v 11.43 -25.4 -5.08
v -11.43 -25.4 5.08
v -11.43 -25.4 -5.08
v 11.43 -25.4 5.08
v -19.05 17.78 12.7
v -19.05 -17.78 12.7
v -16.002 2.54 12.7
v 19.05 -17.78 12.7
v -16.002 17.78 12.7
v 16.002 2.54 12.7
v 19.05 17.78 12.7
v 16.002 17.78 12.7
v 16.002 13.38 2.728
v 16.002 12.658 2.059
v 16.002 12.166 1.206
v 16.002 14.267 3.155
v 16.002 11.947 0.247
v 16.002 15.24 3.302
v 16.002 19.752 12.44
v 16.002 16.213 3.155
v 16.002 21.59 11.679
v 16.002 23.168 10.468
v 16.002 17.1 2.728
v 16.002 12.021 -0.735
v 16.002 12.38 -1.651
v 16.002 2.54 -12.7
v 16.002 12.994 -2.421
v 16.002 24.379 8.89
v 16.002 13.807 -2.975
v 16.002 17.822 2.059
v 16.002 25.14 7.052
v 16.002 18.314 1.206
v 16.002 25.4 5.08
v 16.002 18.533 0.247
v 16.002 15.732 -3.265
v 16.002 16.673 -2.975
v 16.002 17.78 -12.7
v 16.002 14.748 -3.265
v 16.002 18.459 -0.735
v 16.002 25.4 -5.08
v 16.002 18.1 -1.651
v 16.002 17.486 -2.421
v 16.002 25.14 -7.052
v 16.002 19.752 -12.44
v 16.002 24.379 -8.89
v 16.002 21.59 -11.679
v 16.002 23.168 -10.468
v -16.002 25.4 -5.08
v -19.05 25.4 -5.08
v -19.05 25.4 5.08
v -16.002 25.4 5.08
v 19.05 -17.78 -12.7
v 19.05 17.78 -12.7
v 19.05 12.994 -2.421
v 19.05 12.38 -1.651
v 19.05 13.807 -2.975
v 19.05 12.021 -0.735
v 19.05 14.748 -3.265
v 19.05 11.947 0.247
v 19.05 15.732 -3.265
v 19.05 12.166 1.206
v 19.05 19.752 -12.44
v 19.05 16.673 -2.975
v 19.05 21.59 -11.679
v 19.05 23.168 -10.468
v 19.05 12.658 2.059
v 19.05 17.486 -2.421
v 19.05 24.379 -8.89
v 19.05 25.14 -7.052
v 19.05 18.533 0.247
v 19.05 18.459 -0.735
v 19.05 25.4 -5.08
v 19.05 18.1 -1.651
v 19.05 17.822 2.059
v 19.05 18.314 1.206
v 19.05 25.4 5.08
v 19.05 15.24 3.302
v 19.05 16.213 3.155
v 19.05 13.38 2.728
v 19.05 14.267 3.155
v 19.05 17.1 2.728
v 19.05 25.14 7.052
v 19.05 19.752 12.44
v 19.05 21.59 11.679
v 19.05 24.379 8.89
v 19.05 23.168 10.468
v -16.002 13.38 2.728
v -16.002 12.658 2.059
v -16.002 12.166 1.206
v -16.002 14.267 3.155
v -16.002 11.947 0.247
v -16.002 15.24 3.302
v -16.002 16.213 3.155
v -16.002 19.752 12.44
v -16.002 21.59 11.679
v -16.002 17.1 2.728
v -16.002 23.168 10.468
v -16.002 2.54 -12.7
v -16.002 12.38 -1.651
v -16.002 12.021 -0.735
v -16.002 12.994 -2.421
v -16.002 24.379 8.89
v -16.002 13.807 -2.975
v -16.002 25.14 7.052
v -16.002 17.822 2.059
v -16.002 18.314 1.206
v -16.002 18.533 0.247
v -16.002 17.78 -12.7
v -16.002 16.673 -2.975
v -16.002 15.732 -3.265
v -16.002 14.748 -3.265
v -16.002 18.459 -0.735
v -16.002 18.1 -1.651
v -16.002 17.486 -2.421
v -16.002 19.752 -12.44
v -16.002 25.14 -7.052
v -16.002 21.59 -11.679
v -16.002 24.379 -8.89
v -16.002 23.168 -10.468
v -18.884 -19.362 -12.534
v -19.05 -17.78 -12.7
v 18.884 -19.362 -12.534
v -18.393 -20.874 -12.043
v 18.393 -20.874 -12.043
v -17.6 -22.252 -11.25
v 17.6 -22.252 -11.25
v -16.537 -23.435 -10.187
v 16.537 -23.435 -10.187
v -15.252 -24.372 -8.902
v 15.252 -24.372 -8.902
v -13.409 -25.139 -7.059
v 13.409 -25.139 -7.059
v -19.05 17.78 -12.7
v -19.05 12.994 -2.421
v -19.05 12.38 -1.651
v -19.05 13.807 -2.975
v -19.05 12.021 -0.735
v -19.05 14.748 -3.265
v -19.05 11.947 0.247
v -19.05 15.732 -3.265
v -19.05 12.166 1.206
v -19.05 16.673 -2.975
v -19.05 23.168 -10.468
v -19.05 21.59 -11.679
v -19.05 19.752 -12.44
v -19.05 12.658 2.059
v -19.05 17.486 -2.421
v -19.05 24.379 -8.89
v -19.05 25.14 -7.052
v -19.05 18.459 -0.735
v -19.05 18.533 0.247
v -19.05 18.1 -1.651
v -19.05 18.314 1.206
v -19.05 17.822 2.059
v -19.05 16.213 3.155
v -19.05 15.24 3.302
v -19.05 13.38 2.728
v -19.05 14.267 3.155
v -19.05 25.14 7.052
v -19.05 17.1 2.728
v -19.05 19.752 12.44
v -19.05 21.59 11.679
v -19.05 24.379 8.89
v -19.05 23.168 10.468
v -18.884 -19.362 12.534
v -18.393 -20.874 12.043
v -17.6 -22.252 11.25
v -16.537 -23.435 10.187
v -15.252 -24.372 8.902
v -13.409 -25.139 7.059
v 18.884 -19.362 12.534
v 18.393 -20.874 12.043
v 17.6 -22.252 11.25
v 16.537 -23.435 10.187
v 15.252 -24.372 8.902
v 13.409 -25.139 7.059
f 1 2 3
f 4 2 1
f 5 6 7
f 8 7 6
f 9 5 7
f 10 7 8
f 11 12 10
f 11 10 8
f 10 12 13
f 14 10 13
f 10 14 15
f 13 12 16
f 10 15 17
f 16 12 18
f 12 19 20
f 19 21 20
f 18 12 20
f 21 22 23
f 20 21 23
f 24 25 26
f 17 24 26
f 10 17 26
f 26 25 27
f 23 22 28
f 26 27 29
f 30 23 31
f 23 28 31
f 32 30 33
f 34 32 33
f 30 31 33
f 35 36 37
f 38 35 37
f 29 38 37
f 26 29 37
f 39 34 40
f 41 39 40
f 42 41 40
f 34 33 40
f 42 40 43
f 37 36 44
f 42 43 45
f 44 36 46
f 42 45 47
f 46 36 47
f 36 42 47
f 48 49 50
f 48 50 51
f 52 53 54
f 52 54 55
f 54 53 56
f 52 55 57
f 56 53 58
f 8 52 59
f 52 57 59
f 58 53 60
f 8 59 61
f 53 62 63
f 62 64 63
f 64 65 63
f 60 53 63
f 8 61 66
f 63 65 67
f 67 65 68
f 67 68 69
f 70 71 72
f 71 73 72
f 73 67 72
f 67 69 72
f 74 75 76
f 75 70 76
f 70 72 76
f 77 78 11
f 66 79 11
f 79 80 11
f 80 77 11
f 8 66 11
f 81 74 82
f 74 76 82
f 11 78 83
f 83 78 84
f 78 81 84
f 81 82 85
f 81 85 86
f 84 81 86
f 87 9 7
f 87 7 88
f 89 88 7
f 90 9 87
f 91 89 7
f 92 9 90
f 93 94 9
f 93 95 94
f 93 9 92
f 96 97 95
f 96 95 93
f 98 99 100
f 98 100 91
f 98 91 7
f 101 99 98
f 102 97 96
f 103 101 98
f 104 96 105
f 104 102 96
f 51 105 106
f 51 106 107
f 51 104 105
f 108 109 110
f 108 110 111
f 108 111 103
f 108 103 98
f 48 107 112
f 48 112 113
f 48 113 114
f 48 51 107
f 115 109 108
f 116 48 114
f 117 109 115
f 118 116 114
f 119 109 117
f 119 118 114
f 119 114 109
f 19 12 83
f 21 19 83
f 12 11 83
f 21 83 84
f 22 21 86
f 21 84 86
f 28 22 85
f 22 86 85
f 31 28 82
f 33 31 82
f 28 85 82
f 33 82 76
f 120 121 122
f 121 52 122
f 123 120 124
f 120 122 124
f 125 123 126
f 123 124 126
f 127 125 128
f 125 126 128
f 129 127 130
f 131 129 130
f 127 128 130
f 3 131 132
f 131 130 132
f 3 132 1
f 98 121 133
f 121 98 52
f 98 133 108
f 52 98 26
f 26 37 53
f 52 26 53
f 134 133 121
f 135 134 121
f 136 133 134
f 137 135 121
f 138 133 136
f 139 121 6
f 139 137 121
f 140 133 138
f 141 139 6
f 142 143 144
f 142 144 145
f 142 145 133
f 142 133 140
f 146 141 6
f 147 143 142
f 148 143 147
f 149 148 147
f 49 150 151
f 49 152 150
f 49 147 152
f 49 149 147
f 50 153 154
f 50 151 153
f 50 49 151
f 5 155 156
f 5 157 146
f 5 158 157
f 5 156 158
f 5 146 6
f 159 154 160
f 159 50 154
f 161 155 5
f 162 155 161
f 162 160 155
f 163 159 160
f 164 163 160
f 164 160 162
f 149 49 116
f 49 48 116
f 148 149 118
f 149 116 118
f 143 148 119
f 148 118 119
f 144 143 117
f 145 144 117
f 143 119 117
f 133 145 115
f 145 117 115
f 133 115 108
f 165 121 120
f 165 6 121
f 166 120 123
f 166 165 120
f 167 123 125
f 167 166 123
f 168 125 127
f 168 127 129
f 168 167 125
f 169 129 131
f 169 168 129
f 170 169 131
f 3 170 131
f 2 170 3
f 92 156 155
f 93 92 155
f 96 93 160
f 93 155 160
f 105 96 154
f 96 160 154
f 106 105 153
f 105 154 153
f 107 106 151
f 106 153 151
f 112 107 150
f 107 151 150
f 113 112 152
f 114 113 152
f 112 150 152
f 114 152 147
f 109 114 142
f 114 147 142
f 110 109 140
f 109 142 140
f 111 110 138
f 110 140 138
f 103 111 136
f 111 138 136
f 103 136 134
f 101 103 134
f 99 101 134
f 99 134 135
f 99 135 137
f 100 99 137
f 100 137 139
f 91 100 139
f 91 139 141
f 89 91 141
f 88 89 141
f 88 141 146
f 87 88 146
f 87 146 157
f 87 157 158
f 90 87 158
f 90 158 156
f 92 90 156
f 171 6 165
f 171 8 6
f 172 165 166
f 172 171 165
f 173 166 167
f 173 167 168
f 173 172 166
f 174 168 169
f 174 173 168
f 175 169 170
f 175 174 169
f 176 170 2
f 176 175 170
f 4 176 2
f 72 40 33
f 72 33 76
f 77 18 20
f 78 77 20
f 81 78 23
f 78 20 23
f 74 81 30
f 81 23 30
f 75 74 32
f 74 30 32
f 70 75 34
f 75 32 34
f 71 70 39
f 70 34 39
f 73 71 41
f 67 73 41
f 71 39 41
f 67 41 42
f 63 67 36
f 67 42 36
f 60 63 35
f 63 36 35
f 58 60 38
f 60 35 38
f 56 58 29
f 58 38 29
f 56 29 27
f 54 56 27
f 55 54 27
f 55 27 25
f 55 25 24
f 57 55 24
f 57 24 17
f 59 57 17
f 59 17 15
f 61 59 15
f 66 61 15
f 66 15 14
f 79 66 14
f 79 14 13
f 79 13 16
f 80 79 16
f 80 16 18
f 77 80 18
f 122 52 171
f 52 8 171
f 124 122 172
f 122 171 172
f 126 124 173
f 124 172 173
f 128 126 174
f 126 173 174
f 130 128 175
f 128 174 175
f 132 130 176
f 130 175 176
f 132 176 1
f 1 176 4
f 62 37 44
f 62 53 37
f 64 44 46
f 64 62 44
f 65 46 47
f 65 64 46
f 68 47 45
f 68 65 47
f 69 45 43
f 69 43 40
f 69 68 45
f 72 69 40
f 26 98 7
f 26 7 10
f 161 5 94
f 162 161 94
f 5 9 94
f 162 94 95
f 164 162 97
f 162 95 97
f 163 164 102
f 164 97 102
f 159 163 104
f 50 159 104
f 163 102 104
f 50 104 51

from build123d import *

# Parameters (mm, degrees)
SKETCH1_W           = 38.1
SKETCH1_H           = 25.4
BOSS_EXTRUDE1_DEPTH = 25.4
SKETCH2_W           = 32.004
SKETCH2_H           = 25.4
CUT_EXTRUDE1_DEPTH  = 22.86
SKETCH3_R           = 3.302
CUT_EXTRUDE2_DEPTH  = 48.519048812
FILLET1_R           = 7.62
SKETCH4_W           = 38.1
SKETCH4_H           = 25.4
BOSS_EXTRUDE2_DEPTH = 25.4
FILLET2_R           = 7.62


with BuildPart() as part:
    # Sketch1 → Boss-Extrude1 (new body)
    with BuildSketch(Plane(origin=(0, 0, 0), x_dir=(1, 0, 0), z_dir=(0, 1, 0))):
        Rectangle(SKETCH1_W, SKETCH1_H)
    extrude(amount=BOSS_EXTRUDE1_DEPTH)

    # Sketch2 → Cut-Extrude1 (cut)
    with BuildSketch(Plane(origin=(0, 25.4, 0), x_dir=(1, 0, 0), z_dir=(0, 1, 0))):
        Rectangle(SKETCH2_W, SKETCH2_H)
    extrude(amount=-CUT_EXTRUDE1_DEPTH, mode=Mode.SUBTRACT)

    # Sketch3 → Cut-Extrude2 (cut, through all)
    with BuildSketch(Plane.ZY.offset(19.05)):
        with Locations((0, 15.24)):
            Circle(SKETCH3_R)
    extrude(amount=-CUT_EXTRUDE2_DEPTH, mode=Mode.SUBTRACT)

    # Fillet1
    fillet1_edges = [part.edges().sort_by_distance(p)[0] for p in [
        (-17.526, 25.4, -12.7),
        (17.526, 25.4, 12.7),
        (-17.526, 25.4, 12.7),
        (17.526, 25.4, -12.7),
    ]]
    fillet(fillet1_edges, radius=FILLET1_R)

    # Sketch4 → Boss-Extrude2 (add)
    with BuildSketch(Plane.XZ):
        Rectangle(SKETCH4_W, SKETCH4_H)
    extrude(amount=BOSS_EXTRUDE2_DEPTH)

    # Fillet2
    fillet2_edges = [part.edges().sort_by_distance(p)[0] for p in [
        (-19.05, -25.4, 0),
        (0, -25.4, -12.7),
        (19.05, -25.4, 0),
        (0, -25.4, 12.7),
    ]]
    fillet(fillet2_edges, radius=FILLET2_R)


solid = part.part
